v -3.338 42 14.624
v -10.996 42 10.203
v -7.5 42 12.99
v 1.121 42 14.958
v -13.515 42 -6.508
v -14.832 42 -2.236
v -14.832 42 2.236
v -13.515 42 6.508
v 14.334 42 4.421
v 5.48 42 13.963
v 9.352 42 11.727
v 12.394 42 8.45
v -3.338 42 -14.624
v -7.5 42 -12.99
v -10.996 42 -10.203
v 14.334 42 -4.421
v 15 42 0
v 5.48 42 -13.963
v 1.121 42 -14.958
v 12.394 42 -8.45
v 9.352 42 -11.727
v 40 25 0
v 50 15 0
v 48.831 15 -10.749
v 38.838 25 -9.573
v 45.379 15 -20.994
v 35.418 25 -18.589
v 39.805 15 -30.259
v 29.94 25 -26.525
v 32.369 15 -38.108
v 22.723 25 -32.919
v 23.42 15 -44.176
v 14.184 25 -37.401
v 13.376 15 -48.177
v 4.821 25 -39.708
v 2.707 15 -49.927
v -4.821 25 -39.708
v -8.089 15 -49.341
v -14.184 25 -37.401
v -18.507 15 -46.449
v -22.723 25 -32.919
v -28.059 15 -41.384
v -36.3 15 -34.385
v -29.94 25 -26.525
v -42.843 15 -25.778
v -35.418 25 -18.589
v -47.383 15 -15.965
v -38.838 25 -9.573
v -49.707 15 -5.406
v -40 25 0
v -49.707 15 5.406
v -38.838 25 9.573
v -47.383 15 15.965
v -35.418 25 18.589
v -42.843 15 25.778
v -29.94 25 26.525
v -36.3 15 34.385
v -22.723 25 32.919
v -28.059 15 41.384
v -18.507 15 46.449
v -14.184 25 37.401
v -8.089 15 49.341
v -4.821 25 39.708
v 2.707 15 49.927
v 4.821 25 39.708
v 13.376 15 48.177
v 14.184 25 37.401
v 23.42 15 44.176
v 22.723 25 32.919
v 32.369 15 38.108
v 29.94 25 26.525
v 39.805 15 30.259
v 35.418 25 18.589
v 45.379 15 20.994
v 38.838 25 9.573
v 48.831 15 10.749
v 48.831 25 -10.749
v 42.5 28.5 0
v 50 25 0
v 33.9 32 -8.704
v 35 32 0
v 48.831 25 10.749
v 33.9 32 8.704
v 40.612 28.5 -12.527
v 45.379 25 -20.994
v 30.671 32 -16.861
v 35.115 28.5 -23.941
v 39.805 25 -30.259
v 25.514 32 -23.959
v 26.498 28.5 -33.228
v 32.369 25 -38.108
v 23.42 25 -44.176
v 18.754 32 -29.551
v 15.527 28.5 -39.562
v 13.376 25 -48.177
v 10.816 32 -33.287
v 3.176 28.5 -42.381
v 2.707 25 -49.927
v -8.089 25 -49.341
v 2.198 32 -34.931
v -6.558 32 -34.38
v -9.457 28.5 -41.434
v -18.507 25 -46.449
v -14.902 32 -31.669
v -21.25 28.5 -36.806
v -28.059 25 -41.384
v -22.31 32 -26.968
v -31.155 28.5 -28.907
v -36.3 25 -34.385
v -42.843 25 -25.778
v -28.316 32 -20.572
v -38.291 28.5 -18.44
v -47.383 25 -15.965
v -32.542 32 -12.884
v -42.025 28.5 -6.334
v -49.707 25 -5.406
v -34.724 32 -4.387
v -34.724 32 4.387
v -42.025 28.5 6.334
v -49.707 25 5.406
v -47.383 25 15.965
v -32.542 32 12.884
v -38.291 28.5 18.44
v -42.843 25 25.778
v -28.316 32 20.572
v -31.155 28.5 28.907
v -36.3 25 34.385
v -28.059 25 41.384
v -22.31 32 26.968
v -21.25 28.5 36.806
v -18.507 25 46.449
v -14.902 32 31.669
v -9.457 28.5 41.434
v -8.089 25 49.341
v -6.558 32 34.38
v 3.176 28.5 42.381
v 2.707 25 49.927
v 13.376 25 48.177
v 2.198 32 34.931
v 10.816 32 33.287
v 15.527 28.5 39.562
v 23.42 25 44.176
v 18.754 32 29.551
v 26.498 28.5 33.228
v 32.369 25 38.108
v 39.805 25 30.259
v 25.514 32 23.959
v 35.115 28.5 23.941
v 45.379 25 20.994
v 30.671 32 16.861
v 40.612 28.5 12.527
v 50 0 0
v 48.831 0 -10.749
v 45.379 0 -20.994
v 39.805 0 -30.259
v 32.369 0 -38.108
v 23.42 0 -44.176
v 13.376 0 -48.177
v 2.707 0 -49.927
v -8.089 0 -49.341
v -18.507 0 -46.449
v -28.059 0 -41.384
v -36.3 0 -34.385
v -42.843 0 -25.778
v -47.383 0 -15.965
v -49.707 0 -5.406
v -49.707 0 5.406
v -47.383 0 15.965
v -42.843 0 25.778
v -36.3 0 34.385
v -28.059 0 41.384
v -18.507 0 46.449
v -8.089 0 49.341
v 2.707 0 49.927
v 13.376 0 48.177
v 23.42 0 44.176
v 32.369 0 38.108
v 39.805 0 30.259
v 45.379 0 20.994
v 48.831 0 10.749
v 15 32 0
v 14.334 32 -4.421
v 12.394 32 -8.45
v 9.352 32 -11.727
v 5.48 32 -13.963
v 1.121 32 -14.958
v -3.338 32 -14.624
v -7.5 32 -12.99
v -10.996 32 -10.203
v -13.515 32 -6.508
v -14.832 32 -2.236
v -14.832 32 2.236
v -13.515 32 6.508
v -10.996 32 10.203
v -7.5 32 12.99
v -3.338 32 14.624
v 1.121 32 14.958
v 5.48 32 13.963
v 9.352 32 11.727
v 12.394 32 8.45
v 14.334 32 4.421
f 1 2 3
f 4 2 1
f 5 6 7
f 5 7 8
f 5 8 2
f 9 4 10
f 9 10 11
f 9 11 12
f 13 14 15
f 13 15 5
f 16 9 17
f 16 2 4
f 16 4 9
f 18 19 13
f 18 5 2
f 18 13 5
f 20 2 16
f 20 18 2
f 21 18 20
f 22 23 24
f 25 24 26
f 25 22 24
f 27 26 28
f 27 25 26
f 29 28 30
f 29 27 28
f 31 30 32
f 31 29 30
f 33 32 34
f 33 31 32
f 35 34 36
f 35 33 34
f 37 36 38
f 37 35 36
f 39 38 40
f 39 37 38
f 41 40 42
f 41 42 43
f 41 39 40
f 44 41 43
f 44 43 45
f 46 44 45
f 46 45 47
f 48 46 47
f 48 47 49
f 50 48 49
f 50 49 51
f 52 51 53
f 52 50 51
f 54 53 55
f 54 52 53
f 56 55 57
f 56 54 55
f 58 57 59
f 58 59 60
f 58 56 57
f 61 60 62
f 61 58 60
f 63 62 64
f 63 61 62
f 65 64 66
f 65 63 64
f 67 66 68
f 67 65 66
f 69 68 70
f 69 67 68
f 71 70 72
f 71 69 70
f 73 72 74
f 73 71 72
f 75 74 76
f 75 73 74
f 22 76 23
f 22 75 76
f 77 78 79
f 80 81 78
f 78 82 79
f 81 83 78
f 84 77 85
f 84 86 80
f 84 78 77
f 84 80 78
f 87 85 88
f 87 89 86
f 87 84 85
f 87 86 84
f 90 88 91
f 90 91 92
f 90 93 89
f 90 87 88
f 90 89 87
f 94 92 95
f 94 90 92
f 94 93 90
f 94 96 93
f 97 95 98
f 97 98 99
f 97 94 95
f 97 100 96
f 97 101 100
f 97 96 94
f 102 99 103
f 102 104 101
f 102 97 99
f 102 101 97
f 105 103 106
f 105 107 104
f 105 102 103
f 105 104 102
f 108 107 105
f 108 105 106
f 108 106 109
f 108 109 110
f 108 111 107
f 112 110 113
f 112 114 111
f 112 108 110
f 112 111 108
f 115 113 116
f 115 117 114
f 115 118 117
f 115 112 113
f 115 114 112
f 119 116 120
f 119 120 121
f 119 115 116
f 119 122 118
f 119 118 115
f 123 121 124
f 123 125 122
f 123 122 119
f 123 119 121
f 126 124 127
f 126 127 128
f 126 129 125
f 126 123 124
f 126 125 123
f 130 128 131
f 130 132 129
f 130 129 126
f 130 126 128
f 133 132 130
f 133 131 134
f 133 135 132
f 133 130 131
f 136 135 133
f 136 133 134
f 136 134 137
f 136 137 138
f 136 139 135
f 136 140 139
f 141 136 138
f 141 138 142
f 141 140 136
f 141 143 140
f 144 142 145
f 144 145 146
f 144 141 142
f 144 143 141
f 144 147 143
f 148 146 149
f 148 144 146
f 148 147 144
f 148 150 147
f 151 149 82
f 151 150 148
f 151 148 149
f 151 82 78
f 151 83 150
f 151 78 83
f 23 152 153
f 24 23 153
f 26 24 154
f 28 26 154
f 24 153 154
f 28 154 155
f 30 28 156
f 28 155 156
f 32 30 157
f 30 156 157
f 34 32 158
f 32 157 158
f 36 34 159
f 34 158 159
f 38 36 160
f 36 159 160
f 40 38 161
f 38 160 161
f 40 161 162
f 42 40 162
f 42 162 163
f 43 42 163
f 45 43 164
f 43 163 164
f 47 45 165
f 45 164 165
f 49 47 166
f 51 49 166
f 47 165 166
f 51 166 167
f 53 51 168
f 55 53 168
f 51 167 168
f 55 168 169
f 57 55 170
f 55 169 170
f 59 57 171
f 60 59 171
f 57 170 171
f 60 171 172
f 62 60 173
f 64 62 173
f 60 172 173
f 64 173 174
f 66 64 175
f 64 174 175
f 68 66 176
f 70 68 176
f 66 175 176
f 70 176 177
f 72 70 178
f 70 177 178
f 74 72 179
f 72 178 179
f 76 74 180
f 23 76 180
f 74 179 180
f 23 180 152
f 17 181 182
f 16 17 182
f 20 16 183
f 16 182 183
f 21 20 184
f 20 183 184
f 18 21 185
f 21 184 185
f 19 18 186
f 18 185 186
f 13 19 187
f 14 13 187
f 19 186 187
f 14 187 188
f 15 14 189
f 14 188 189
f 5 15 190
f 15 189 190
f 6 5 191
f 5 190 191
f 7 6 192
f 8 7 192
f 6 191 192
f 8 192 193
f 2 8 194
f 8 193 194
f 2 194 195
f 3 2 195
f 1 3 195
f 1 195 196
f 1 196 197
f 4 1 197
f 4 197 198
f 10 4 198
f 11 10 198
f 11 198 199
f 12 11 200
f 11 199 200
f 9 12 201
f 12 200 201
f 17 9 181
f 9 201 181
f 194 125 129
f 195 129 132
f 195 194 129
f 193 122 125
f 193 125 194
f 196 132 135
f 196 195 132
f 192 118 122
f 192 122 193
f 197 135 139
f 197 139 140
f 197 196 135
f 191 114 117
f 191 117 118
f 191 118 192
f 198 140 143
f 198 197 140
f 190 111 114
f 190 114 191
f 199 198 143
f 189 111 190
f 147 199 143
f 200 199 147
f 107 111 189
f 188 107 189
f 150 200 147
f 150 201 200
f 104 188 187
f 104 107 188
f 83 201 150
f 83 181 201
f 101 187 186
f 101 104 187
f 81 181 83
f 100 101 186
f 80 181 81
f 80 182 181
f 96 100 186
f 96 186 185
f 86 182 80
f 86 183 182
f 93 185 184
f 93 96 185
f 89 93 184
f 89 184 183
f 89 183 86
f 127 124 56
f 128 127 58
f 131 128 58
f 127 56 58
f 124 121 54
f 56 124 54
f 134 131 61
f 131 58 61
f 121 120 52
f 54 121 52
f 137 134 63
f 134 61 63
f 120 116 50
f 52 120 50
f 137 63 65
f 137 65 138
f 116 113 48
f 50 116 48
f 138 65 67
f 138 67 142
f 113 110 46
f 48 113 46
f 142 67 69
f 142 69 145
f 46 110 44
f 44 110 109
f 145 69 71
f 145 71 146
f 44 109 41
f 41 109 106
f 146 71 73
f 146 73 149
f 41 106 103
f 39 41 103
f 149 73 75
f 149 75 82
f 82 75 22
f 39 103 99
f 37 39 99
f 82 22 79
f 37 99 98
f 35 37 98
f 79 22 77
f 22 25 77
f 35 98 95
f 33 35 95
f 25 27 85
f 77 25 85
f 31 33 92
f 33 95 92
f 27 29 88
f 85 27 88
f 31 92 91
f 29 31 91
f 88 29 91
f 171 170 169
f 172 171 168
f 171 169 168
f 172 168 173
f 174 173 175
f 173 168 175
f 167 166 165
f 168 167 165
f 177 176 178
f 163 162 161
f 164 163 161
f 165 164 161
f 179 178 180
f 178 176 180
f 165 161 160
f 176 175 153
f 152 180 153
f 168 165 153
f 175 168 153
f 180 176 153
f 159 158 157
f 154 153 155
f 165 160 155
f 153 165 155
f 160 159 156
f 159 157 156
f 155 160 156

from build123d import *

# Parameters (mm, degrees)
SKETCH1_R           = 50
BOSS_EXTRUDE1_DEPTH = 25
CHAMFER1_SIZE       = 10
SKETCH7_R           = 50
SKETCH8_R           = 35
SKETCH9_R           = 15
BOSS_EXTRUDE5_DEPTH = 10


with BuildPart() as part:
    # Sketch1 → Boss-Extrude1 (new body)
    with BuildSketch(Plane(origin=(0, 0, 0), x_dir=(1, 0, 0), z_dir=(0, 1, 0))):
        Circle(SKETCH1_R)
    extrude(amount=BOSS_EXTRUDE1_DEPTH)

    # Chamfer1
    chamfer1_edges = [part.edges().sort_by_distance(p)[0] for p in [
        (-50, 25, 0),
    ]]
    chamfer(chamfer1_edges, length=CHAMFER1_SIZE)

    # Sketch7 → Loft1 section 0
    with BuildSketch(Plane(origin=(0, 25, 0), x_dir=(1, 0, 0), z_dir=(0, 1, 0))):
        Circle(SKETCH7_R)
    # Sketch8 → Loft1 section 1
    with BuildSketch(Plane(origin=(0, 32, 0), x_dir=(1, 0, 0), z_dir=(0, 1, 0))):
        Circle(SKETCH8_R)
    loft()

    # Sketch9 → Boss-Extrude5 (add)
    with BuildSketch(Plane(origin=(0, 32, 0), x_dir=(1, 0, 0), z_dir=(0, 1, 0))):
        Circle(SKETCH9_R)
    extrude(amount=BOSS_EXTRUDE5_DEPTH)


solid = part.part
